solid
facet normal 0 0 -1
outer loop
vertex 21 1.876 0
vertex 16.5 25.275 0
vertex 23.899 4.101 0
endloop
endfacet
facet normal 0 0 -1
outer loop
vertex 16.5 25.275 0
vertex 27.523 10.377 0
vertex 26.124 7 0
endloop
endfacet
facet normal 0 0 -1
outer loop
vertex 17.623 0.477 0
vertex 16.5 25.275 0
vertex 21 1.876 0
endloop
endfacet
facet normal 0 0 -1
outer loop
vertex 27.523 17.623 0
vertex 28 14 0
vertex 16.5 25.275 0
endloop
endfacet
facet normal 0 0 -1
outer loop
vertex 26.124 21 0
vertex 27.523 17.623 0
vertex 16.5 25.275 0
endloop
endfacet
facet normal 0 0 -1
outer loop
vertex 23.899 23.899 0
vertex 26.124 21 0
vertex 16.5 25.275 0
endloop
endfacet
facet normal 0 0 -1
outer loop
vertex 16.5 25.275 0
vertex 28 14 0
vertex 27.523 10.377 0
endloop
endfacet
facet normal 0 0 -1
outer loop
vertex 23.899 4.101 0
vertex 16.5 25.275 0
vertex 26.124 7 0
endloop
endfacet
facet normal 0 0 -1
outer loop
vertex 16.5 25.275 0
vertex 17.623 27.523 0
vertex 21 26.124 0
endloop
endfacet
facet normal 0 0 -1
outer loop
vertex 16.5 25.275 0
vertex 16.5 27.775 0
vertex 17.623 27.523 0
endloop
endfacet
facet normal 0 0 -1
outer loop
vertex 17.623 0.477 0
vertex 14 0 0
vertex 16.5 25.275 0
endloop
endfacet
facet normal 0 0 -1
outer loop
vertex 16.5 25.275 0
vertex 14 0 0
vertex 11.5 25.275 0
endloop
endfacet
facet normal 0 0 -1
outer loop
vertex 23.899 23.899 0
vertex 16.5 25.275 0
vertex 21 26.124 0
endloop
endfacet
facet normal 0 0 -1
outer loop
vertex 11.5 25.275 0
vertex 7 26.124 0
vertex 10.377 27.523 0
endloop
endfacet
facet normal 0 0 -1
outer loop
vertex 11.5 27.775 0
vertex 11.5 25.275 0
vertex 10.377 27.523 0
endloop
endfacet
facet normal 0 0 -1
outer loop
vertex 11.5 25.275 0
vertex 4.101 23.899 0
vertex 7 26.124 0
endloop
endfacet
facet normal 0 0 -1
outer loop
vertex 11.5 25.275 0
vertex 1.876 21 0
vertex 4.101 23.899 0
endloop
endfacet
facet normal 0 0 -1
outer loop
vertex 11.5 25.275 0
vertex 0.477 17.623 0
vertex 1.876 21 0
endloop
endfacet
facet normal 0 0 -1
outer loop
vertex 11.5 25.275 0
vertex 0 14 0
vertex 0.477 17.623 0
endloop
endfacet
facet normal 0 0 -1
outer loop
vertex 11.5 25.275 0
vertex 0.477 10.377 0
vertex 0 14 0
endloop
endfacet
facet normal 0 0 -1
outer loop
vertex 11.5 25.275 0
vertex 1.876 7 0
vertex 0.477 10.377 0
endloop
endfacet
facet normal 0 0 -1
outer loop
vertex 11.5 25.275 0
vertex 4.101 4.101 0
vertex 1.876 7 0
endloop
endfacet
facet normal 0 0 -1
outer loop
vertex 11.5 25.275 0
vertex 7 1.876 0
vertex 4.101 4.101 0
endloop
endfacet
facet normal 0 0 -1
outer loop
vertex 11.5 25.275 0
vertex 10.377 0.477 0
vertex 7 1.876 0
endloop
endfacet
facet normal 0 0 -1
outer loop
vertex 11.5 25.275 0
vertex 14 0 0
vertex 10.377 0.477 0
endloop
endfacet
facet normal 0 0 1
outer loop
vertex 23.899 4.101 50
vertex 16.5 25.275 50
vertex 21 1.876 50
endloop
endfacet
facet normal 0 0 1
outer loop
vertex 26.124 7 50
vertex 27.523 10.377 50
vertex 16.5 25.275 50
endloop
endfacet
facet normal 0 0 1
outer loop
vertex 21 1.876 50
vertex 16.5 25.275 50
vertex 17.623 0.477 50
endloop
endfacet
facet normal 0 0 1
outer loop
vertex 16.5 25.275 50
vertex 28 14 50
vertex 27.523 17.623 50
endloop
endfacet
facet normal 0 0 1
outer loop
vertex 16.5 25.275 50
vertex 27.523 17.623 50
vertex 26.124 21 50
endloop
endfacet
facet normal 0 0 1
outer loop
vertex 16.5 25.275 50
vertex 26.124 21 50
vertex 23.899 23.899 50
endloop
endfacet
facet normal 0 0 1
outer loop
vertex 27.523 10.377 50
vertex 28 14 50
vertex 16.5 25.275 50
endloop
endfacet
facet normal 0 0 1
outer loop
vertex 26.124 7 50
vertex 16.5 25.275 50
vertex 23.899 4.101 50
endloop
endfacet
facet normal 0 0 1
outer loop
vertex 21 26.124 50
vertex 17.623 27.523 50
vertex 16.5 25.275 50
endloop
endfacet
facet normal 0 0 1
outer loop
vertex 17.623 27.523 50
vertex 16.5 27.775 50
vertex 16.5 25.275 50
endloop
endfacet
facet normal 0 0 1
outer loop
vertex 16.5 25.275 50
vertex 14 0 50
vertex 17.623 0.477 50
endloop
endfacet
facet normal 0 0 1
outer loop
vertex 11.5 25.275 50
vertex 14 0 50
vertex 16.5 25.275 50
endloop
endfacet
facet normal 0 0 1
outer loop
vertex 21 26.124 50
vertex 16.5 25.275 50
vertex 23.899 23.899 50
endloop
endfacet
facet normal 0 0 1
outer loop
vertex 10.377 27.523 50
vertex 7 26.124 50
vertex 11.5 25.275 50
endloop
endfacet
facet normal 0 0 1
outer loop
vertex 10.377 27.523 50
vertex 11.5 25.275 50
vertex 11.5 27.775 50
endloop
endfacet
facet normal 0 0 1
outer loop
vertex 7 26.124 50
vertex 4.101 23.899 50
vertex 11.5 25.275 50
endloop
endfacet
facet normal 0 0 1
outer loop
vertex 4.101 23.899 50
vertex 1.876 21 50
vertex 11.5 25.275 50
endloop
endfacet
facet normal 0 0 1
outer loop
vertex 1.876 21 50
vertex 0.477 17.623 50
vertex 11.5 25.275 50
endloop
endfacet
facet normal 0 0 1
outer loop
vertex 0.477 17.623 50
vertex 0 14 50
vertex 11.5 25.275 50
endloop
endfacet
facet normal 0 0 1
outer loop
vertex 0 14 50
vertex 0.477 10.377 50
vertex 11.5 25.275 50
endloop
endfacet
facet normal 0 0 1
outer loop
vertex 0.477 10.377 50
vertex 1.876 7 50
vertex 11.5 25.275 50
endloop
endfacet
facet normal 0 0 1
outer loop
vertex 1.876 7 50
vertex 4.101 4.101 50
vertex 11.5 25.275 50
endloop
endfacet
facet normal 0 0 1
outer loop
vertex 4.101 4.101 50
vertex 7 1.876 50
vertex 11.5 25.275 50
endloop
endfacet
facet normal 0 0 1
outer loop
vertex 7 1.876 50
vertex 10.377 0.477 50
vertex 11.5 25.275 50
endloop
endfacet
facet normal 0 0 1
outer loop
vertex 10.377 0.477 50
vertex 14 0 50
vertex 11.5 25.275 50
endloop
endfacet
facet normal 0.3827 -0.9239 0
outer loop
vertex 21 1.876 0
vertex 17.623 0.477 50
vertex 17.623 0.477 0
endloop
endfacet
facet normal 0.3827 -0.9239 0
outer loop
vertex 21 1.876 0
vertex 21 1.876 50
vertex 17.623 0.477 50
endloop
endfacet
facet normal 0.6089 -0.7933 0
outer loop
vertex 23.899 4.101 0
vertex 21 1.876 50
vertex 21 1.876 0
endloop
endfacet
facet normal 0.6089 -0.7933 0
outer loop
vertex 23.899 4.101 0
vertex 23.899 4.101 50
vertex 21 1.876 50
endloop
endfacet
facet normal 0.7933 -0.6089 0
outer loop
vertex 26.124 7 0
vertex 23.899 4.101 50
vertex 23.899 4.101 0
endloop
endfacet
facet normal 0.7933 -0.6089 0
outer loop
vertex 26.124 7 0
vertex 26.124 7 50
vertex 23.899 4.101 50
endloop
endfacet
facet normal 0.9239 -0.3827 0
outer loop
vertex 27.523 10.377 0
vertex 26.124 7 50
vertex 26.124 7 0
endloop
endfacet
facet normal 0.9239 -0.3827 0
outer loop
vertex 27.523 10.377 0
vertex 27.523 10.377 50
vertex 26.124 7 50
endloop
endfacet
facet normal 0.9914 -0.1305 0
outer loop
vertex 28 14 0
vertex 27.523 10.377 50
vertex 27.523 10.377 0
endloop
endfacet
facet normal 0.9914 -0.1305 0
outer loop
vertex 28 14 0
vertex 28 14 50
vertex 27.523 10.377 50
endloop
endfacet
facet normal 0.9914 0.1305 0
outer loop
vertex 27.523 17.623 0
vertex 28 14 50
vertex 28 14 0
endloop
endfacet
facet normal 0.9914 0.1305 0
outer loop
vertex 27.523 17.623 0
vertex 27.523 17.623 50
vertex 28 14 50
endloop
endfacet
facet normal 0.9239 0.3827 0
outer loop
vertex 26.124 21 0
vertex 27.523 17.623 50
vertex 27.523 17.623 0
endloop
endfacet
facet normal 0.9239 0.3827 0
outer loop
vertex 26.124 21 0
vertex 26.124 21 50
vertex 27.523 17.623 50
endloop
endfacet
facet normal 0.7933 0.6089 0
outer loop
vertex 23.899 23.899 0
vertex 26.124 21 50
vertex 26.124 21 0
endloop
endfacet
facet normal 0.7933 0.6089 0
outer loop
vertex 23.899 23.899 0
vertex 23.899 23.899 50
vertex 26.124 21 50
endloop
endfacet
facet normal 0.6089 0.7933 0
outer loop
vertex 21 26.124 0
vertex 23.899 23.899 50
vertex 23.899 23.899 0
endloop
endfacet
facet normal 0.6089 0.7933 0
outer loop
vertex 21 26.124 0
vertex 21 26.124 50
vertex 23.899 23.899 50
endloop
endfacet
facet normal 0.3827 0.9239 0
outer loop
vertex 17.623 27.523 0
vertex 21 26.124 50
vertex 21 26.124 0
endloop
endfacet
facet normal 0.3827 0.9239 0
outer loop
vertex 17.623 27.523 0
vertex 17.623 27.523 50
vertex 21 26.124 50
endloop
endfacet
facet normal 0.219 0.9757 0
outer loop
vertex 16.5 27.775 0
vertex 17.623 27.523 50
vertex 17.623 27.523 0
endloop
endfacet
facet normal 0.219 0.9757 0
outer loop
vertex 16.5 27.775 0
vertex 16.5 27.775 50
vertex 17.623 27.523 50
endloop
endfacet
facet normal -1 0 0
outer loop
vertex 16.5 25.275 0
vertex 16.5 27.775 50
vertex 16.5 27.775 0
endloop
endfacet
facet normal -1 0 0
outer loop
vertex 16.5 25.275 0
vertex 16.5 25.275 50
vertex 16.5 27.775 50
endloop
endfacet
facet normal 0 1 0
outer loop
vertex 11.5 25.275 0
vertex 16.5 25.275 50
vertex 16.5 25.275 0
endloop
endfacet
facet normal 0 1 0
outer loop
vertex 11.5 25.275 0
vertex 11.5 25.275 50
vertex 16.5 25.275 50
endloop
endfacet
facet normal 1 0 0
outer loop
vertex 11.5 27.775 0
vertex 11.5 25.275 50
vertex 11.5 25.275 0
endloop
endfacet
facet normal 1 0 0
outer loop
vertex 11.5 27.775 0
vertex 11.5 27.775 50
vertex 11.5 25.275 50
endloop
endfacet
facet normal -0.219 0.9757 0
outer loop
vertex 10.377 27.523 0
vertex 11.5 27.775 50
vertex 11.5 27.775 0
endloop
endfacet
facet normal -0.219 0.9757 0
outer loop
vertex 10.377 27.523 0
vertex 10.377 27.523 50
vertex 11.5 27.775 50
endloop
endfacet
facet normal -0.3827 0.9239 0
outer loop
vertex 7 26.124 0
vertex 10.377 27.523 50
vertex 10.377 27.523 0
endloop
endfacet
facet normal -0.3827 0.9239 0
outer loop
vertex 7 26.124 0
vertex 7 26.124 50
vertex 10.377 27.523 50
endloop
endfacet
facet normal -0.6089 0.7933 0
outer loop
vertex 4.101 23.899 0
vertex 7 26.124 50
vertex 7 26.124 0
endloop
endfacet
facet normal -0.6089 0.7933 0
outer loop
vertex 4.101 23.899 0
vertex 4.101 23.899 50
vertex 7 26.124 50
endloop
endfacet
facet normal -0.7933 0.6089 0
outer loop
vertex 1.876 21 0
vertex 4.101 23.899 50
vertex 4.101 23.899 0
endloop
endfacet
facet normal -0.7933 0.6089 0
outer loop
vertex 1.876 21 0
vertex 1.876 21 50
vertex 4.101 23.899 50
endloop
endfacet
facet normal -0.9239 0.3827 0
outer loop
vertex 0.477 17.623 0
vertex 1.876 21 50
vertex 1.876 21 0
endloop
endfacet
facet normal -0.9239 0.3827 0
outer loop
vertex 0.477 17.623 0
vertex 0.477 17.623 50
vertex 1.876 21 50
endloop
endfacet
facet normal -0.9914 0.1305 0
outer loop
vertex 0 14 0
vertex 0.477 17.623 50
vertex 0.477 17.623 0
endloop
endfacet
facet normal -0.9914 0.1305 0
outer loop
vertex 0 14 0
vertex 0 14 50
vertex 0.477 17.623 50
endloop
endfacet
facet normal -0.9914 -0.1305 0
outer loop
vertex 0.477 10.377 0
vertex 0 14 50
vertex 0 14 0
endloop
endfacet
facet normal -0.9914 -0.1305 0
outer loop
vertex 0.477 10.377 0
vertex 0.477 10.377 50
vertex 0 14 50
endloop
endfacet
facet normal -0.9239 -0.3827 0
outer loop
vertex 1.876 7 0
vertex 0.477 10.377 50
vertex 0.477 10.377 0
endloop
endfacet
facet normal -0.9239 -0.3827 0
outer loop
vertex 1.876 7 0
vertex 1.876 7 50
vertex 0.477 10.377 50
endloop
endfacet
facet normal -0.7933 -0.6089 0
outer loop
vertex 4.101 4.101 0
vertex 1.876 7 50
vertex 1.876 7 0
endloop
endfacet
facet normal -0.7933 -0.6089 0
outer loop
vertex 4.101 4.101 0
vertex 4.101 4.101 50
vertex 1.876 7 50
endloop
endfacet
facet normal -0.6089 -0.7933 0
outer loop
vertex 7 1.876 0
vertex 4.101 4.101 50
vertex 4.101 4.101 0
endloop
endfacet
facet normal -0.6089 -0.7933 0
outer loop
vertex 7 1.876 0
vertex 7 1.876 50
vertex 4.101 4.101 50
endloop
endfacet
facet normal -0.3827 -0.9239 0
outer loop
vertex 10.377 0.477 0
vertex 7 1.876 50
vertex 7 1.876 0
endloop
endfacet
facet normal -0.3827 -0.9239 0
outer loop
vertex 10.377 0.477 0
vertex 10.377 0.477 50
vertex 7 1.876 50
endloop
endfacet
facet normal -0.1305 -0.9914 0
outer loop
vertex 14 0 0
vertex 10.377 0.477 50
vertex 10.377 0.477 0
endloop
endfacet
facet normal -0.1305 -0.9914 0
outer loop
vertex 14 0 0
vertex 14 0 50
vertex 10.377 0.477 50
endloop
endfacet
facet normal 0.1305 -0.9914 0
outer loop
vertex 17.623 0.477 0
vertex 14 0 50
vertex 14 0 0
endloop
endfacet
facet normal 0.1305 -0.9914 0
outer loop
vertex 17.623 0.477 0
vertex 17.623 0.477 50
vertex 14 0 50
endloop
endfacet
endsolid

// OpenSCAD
$fn = 32;

// ----------------------------------------------------------------------
// Keyway shaft: d28 shaft, key 5 x 2.5 mm
// ----------------------------------------------------------------------

// --- parameters (mm) ---
shaft_r = 14;             // shaft radius
key_w = 5;                // keyway width
key_d = 2.5;              // keyway depth below the surface line
plate_t = 50;             // shaft length, Z (extrusion height)

shaft_d = 2 * shaft_r;  // shaft diameter
circle_step = 15;  // polygon sampling step, degrees

profile = [[10.377, 27.523], [7, 26.124], [4.101, 23.899], [1.876, 21], [0.477, 17.623], [0, 14], [0.477, 10.377], [1.876, 7], [4.101, 4.101], [7, 1.876], [10.377, 0.477], [14, 0], [17.623, 0.477], [21, 1.876], [23.899, 4.101], [26.124, 7], [27.523, 10.377], [28, 14], [27.523, 17.623], [26.124, 21], [23.899, 23.899], [21, 26.124], [17.623, 27.523], [16.5, 27.775], [16.5, 25.275], [11.5, 25.275], [11.5, 27.775]];  // primary outline, 27 points, counter clockwise

// --- the one profile operation ---
linear_extrude(height = plate_t) polygon(points = profile);
